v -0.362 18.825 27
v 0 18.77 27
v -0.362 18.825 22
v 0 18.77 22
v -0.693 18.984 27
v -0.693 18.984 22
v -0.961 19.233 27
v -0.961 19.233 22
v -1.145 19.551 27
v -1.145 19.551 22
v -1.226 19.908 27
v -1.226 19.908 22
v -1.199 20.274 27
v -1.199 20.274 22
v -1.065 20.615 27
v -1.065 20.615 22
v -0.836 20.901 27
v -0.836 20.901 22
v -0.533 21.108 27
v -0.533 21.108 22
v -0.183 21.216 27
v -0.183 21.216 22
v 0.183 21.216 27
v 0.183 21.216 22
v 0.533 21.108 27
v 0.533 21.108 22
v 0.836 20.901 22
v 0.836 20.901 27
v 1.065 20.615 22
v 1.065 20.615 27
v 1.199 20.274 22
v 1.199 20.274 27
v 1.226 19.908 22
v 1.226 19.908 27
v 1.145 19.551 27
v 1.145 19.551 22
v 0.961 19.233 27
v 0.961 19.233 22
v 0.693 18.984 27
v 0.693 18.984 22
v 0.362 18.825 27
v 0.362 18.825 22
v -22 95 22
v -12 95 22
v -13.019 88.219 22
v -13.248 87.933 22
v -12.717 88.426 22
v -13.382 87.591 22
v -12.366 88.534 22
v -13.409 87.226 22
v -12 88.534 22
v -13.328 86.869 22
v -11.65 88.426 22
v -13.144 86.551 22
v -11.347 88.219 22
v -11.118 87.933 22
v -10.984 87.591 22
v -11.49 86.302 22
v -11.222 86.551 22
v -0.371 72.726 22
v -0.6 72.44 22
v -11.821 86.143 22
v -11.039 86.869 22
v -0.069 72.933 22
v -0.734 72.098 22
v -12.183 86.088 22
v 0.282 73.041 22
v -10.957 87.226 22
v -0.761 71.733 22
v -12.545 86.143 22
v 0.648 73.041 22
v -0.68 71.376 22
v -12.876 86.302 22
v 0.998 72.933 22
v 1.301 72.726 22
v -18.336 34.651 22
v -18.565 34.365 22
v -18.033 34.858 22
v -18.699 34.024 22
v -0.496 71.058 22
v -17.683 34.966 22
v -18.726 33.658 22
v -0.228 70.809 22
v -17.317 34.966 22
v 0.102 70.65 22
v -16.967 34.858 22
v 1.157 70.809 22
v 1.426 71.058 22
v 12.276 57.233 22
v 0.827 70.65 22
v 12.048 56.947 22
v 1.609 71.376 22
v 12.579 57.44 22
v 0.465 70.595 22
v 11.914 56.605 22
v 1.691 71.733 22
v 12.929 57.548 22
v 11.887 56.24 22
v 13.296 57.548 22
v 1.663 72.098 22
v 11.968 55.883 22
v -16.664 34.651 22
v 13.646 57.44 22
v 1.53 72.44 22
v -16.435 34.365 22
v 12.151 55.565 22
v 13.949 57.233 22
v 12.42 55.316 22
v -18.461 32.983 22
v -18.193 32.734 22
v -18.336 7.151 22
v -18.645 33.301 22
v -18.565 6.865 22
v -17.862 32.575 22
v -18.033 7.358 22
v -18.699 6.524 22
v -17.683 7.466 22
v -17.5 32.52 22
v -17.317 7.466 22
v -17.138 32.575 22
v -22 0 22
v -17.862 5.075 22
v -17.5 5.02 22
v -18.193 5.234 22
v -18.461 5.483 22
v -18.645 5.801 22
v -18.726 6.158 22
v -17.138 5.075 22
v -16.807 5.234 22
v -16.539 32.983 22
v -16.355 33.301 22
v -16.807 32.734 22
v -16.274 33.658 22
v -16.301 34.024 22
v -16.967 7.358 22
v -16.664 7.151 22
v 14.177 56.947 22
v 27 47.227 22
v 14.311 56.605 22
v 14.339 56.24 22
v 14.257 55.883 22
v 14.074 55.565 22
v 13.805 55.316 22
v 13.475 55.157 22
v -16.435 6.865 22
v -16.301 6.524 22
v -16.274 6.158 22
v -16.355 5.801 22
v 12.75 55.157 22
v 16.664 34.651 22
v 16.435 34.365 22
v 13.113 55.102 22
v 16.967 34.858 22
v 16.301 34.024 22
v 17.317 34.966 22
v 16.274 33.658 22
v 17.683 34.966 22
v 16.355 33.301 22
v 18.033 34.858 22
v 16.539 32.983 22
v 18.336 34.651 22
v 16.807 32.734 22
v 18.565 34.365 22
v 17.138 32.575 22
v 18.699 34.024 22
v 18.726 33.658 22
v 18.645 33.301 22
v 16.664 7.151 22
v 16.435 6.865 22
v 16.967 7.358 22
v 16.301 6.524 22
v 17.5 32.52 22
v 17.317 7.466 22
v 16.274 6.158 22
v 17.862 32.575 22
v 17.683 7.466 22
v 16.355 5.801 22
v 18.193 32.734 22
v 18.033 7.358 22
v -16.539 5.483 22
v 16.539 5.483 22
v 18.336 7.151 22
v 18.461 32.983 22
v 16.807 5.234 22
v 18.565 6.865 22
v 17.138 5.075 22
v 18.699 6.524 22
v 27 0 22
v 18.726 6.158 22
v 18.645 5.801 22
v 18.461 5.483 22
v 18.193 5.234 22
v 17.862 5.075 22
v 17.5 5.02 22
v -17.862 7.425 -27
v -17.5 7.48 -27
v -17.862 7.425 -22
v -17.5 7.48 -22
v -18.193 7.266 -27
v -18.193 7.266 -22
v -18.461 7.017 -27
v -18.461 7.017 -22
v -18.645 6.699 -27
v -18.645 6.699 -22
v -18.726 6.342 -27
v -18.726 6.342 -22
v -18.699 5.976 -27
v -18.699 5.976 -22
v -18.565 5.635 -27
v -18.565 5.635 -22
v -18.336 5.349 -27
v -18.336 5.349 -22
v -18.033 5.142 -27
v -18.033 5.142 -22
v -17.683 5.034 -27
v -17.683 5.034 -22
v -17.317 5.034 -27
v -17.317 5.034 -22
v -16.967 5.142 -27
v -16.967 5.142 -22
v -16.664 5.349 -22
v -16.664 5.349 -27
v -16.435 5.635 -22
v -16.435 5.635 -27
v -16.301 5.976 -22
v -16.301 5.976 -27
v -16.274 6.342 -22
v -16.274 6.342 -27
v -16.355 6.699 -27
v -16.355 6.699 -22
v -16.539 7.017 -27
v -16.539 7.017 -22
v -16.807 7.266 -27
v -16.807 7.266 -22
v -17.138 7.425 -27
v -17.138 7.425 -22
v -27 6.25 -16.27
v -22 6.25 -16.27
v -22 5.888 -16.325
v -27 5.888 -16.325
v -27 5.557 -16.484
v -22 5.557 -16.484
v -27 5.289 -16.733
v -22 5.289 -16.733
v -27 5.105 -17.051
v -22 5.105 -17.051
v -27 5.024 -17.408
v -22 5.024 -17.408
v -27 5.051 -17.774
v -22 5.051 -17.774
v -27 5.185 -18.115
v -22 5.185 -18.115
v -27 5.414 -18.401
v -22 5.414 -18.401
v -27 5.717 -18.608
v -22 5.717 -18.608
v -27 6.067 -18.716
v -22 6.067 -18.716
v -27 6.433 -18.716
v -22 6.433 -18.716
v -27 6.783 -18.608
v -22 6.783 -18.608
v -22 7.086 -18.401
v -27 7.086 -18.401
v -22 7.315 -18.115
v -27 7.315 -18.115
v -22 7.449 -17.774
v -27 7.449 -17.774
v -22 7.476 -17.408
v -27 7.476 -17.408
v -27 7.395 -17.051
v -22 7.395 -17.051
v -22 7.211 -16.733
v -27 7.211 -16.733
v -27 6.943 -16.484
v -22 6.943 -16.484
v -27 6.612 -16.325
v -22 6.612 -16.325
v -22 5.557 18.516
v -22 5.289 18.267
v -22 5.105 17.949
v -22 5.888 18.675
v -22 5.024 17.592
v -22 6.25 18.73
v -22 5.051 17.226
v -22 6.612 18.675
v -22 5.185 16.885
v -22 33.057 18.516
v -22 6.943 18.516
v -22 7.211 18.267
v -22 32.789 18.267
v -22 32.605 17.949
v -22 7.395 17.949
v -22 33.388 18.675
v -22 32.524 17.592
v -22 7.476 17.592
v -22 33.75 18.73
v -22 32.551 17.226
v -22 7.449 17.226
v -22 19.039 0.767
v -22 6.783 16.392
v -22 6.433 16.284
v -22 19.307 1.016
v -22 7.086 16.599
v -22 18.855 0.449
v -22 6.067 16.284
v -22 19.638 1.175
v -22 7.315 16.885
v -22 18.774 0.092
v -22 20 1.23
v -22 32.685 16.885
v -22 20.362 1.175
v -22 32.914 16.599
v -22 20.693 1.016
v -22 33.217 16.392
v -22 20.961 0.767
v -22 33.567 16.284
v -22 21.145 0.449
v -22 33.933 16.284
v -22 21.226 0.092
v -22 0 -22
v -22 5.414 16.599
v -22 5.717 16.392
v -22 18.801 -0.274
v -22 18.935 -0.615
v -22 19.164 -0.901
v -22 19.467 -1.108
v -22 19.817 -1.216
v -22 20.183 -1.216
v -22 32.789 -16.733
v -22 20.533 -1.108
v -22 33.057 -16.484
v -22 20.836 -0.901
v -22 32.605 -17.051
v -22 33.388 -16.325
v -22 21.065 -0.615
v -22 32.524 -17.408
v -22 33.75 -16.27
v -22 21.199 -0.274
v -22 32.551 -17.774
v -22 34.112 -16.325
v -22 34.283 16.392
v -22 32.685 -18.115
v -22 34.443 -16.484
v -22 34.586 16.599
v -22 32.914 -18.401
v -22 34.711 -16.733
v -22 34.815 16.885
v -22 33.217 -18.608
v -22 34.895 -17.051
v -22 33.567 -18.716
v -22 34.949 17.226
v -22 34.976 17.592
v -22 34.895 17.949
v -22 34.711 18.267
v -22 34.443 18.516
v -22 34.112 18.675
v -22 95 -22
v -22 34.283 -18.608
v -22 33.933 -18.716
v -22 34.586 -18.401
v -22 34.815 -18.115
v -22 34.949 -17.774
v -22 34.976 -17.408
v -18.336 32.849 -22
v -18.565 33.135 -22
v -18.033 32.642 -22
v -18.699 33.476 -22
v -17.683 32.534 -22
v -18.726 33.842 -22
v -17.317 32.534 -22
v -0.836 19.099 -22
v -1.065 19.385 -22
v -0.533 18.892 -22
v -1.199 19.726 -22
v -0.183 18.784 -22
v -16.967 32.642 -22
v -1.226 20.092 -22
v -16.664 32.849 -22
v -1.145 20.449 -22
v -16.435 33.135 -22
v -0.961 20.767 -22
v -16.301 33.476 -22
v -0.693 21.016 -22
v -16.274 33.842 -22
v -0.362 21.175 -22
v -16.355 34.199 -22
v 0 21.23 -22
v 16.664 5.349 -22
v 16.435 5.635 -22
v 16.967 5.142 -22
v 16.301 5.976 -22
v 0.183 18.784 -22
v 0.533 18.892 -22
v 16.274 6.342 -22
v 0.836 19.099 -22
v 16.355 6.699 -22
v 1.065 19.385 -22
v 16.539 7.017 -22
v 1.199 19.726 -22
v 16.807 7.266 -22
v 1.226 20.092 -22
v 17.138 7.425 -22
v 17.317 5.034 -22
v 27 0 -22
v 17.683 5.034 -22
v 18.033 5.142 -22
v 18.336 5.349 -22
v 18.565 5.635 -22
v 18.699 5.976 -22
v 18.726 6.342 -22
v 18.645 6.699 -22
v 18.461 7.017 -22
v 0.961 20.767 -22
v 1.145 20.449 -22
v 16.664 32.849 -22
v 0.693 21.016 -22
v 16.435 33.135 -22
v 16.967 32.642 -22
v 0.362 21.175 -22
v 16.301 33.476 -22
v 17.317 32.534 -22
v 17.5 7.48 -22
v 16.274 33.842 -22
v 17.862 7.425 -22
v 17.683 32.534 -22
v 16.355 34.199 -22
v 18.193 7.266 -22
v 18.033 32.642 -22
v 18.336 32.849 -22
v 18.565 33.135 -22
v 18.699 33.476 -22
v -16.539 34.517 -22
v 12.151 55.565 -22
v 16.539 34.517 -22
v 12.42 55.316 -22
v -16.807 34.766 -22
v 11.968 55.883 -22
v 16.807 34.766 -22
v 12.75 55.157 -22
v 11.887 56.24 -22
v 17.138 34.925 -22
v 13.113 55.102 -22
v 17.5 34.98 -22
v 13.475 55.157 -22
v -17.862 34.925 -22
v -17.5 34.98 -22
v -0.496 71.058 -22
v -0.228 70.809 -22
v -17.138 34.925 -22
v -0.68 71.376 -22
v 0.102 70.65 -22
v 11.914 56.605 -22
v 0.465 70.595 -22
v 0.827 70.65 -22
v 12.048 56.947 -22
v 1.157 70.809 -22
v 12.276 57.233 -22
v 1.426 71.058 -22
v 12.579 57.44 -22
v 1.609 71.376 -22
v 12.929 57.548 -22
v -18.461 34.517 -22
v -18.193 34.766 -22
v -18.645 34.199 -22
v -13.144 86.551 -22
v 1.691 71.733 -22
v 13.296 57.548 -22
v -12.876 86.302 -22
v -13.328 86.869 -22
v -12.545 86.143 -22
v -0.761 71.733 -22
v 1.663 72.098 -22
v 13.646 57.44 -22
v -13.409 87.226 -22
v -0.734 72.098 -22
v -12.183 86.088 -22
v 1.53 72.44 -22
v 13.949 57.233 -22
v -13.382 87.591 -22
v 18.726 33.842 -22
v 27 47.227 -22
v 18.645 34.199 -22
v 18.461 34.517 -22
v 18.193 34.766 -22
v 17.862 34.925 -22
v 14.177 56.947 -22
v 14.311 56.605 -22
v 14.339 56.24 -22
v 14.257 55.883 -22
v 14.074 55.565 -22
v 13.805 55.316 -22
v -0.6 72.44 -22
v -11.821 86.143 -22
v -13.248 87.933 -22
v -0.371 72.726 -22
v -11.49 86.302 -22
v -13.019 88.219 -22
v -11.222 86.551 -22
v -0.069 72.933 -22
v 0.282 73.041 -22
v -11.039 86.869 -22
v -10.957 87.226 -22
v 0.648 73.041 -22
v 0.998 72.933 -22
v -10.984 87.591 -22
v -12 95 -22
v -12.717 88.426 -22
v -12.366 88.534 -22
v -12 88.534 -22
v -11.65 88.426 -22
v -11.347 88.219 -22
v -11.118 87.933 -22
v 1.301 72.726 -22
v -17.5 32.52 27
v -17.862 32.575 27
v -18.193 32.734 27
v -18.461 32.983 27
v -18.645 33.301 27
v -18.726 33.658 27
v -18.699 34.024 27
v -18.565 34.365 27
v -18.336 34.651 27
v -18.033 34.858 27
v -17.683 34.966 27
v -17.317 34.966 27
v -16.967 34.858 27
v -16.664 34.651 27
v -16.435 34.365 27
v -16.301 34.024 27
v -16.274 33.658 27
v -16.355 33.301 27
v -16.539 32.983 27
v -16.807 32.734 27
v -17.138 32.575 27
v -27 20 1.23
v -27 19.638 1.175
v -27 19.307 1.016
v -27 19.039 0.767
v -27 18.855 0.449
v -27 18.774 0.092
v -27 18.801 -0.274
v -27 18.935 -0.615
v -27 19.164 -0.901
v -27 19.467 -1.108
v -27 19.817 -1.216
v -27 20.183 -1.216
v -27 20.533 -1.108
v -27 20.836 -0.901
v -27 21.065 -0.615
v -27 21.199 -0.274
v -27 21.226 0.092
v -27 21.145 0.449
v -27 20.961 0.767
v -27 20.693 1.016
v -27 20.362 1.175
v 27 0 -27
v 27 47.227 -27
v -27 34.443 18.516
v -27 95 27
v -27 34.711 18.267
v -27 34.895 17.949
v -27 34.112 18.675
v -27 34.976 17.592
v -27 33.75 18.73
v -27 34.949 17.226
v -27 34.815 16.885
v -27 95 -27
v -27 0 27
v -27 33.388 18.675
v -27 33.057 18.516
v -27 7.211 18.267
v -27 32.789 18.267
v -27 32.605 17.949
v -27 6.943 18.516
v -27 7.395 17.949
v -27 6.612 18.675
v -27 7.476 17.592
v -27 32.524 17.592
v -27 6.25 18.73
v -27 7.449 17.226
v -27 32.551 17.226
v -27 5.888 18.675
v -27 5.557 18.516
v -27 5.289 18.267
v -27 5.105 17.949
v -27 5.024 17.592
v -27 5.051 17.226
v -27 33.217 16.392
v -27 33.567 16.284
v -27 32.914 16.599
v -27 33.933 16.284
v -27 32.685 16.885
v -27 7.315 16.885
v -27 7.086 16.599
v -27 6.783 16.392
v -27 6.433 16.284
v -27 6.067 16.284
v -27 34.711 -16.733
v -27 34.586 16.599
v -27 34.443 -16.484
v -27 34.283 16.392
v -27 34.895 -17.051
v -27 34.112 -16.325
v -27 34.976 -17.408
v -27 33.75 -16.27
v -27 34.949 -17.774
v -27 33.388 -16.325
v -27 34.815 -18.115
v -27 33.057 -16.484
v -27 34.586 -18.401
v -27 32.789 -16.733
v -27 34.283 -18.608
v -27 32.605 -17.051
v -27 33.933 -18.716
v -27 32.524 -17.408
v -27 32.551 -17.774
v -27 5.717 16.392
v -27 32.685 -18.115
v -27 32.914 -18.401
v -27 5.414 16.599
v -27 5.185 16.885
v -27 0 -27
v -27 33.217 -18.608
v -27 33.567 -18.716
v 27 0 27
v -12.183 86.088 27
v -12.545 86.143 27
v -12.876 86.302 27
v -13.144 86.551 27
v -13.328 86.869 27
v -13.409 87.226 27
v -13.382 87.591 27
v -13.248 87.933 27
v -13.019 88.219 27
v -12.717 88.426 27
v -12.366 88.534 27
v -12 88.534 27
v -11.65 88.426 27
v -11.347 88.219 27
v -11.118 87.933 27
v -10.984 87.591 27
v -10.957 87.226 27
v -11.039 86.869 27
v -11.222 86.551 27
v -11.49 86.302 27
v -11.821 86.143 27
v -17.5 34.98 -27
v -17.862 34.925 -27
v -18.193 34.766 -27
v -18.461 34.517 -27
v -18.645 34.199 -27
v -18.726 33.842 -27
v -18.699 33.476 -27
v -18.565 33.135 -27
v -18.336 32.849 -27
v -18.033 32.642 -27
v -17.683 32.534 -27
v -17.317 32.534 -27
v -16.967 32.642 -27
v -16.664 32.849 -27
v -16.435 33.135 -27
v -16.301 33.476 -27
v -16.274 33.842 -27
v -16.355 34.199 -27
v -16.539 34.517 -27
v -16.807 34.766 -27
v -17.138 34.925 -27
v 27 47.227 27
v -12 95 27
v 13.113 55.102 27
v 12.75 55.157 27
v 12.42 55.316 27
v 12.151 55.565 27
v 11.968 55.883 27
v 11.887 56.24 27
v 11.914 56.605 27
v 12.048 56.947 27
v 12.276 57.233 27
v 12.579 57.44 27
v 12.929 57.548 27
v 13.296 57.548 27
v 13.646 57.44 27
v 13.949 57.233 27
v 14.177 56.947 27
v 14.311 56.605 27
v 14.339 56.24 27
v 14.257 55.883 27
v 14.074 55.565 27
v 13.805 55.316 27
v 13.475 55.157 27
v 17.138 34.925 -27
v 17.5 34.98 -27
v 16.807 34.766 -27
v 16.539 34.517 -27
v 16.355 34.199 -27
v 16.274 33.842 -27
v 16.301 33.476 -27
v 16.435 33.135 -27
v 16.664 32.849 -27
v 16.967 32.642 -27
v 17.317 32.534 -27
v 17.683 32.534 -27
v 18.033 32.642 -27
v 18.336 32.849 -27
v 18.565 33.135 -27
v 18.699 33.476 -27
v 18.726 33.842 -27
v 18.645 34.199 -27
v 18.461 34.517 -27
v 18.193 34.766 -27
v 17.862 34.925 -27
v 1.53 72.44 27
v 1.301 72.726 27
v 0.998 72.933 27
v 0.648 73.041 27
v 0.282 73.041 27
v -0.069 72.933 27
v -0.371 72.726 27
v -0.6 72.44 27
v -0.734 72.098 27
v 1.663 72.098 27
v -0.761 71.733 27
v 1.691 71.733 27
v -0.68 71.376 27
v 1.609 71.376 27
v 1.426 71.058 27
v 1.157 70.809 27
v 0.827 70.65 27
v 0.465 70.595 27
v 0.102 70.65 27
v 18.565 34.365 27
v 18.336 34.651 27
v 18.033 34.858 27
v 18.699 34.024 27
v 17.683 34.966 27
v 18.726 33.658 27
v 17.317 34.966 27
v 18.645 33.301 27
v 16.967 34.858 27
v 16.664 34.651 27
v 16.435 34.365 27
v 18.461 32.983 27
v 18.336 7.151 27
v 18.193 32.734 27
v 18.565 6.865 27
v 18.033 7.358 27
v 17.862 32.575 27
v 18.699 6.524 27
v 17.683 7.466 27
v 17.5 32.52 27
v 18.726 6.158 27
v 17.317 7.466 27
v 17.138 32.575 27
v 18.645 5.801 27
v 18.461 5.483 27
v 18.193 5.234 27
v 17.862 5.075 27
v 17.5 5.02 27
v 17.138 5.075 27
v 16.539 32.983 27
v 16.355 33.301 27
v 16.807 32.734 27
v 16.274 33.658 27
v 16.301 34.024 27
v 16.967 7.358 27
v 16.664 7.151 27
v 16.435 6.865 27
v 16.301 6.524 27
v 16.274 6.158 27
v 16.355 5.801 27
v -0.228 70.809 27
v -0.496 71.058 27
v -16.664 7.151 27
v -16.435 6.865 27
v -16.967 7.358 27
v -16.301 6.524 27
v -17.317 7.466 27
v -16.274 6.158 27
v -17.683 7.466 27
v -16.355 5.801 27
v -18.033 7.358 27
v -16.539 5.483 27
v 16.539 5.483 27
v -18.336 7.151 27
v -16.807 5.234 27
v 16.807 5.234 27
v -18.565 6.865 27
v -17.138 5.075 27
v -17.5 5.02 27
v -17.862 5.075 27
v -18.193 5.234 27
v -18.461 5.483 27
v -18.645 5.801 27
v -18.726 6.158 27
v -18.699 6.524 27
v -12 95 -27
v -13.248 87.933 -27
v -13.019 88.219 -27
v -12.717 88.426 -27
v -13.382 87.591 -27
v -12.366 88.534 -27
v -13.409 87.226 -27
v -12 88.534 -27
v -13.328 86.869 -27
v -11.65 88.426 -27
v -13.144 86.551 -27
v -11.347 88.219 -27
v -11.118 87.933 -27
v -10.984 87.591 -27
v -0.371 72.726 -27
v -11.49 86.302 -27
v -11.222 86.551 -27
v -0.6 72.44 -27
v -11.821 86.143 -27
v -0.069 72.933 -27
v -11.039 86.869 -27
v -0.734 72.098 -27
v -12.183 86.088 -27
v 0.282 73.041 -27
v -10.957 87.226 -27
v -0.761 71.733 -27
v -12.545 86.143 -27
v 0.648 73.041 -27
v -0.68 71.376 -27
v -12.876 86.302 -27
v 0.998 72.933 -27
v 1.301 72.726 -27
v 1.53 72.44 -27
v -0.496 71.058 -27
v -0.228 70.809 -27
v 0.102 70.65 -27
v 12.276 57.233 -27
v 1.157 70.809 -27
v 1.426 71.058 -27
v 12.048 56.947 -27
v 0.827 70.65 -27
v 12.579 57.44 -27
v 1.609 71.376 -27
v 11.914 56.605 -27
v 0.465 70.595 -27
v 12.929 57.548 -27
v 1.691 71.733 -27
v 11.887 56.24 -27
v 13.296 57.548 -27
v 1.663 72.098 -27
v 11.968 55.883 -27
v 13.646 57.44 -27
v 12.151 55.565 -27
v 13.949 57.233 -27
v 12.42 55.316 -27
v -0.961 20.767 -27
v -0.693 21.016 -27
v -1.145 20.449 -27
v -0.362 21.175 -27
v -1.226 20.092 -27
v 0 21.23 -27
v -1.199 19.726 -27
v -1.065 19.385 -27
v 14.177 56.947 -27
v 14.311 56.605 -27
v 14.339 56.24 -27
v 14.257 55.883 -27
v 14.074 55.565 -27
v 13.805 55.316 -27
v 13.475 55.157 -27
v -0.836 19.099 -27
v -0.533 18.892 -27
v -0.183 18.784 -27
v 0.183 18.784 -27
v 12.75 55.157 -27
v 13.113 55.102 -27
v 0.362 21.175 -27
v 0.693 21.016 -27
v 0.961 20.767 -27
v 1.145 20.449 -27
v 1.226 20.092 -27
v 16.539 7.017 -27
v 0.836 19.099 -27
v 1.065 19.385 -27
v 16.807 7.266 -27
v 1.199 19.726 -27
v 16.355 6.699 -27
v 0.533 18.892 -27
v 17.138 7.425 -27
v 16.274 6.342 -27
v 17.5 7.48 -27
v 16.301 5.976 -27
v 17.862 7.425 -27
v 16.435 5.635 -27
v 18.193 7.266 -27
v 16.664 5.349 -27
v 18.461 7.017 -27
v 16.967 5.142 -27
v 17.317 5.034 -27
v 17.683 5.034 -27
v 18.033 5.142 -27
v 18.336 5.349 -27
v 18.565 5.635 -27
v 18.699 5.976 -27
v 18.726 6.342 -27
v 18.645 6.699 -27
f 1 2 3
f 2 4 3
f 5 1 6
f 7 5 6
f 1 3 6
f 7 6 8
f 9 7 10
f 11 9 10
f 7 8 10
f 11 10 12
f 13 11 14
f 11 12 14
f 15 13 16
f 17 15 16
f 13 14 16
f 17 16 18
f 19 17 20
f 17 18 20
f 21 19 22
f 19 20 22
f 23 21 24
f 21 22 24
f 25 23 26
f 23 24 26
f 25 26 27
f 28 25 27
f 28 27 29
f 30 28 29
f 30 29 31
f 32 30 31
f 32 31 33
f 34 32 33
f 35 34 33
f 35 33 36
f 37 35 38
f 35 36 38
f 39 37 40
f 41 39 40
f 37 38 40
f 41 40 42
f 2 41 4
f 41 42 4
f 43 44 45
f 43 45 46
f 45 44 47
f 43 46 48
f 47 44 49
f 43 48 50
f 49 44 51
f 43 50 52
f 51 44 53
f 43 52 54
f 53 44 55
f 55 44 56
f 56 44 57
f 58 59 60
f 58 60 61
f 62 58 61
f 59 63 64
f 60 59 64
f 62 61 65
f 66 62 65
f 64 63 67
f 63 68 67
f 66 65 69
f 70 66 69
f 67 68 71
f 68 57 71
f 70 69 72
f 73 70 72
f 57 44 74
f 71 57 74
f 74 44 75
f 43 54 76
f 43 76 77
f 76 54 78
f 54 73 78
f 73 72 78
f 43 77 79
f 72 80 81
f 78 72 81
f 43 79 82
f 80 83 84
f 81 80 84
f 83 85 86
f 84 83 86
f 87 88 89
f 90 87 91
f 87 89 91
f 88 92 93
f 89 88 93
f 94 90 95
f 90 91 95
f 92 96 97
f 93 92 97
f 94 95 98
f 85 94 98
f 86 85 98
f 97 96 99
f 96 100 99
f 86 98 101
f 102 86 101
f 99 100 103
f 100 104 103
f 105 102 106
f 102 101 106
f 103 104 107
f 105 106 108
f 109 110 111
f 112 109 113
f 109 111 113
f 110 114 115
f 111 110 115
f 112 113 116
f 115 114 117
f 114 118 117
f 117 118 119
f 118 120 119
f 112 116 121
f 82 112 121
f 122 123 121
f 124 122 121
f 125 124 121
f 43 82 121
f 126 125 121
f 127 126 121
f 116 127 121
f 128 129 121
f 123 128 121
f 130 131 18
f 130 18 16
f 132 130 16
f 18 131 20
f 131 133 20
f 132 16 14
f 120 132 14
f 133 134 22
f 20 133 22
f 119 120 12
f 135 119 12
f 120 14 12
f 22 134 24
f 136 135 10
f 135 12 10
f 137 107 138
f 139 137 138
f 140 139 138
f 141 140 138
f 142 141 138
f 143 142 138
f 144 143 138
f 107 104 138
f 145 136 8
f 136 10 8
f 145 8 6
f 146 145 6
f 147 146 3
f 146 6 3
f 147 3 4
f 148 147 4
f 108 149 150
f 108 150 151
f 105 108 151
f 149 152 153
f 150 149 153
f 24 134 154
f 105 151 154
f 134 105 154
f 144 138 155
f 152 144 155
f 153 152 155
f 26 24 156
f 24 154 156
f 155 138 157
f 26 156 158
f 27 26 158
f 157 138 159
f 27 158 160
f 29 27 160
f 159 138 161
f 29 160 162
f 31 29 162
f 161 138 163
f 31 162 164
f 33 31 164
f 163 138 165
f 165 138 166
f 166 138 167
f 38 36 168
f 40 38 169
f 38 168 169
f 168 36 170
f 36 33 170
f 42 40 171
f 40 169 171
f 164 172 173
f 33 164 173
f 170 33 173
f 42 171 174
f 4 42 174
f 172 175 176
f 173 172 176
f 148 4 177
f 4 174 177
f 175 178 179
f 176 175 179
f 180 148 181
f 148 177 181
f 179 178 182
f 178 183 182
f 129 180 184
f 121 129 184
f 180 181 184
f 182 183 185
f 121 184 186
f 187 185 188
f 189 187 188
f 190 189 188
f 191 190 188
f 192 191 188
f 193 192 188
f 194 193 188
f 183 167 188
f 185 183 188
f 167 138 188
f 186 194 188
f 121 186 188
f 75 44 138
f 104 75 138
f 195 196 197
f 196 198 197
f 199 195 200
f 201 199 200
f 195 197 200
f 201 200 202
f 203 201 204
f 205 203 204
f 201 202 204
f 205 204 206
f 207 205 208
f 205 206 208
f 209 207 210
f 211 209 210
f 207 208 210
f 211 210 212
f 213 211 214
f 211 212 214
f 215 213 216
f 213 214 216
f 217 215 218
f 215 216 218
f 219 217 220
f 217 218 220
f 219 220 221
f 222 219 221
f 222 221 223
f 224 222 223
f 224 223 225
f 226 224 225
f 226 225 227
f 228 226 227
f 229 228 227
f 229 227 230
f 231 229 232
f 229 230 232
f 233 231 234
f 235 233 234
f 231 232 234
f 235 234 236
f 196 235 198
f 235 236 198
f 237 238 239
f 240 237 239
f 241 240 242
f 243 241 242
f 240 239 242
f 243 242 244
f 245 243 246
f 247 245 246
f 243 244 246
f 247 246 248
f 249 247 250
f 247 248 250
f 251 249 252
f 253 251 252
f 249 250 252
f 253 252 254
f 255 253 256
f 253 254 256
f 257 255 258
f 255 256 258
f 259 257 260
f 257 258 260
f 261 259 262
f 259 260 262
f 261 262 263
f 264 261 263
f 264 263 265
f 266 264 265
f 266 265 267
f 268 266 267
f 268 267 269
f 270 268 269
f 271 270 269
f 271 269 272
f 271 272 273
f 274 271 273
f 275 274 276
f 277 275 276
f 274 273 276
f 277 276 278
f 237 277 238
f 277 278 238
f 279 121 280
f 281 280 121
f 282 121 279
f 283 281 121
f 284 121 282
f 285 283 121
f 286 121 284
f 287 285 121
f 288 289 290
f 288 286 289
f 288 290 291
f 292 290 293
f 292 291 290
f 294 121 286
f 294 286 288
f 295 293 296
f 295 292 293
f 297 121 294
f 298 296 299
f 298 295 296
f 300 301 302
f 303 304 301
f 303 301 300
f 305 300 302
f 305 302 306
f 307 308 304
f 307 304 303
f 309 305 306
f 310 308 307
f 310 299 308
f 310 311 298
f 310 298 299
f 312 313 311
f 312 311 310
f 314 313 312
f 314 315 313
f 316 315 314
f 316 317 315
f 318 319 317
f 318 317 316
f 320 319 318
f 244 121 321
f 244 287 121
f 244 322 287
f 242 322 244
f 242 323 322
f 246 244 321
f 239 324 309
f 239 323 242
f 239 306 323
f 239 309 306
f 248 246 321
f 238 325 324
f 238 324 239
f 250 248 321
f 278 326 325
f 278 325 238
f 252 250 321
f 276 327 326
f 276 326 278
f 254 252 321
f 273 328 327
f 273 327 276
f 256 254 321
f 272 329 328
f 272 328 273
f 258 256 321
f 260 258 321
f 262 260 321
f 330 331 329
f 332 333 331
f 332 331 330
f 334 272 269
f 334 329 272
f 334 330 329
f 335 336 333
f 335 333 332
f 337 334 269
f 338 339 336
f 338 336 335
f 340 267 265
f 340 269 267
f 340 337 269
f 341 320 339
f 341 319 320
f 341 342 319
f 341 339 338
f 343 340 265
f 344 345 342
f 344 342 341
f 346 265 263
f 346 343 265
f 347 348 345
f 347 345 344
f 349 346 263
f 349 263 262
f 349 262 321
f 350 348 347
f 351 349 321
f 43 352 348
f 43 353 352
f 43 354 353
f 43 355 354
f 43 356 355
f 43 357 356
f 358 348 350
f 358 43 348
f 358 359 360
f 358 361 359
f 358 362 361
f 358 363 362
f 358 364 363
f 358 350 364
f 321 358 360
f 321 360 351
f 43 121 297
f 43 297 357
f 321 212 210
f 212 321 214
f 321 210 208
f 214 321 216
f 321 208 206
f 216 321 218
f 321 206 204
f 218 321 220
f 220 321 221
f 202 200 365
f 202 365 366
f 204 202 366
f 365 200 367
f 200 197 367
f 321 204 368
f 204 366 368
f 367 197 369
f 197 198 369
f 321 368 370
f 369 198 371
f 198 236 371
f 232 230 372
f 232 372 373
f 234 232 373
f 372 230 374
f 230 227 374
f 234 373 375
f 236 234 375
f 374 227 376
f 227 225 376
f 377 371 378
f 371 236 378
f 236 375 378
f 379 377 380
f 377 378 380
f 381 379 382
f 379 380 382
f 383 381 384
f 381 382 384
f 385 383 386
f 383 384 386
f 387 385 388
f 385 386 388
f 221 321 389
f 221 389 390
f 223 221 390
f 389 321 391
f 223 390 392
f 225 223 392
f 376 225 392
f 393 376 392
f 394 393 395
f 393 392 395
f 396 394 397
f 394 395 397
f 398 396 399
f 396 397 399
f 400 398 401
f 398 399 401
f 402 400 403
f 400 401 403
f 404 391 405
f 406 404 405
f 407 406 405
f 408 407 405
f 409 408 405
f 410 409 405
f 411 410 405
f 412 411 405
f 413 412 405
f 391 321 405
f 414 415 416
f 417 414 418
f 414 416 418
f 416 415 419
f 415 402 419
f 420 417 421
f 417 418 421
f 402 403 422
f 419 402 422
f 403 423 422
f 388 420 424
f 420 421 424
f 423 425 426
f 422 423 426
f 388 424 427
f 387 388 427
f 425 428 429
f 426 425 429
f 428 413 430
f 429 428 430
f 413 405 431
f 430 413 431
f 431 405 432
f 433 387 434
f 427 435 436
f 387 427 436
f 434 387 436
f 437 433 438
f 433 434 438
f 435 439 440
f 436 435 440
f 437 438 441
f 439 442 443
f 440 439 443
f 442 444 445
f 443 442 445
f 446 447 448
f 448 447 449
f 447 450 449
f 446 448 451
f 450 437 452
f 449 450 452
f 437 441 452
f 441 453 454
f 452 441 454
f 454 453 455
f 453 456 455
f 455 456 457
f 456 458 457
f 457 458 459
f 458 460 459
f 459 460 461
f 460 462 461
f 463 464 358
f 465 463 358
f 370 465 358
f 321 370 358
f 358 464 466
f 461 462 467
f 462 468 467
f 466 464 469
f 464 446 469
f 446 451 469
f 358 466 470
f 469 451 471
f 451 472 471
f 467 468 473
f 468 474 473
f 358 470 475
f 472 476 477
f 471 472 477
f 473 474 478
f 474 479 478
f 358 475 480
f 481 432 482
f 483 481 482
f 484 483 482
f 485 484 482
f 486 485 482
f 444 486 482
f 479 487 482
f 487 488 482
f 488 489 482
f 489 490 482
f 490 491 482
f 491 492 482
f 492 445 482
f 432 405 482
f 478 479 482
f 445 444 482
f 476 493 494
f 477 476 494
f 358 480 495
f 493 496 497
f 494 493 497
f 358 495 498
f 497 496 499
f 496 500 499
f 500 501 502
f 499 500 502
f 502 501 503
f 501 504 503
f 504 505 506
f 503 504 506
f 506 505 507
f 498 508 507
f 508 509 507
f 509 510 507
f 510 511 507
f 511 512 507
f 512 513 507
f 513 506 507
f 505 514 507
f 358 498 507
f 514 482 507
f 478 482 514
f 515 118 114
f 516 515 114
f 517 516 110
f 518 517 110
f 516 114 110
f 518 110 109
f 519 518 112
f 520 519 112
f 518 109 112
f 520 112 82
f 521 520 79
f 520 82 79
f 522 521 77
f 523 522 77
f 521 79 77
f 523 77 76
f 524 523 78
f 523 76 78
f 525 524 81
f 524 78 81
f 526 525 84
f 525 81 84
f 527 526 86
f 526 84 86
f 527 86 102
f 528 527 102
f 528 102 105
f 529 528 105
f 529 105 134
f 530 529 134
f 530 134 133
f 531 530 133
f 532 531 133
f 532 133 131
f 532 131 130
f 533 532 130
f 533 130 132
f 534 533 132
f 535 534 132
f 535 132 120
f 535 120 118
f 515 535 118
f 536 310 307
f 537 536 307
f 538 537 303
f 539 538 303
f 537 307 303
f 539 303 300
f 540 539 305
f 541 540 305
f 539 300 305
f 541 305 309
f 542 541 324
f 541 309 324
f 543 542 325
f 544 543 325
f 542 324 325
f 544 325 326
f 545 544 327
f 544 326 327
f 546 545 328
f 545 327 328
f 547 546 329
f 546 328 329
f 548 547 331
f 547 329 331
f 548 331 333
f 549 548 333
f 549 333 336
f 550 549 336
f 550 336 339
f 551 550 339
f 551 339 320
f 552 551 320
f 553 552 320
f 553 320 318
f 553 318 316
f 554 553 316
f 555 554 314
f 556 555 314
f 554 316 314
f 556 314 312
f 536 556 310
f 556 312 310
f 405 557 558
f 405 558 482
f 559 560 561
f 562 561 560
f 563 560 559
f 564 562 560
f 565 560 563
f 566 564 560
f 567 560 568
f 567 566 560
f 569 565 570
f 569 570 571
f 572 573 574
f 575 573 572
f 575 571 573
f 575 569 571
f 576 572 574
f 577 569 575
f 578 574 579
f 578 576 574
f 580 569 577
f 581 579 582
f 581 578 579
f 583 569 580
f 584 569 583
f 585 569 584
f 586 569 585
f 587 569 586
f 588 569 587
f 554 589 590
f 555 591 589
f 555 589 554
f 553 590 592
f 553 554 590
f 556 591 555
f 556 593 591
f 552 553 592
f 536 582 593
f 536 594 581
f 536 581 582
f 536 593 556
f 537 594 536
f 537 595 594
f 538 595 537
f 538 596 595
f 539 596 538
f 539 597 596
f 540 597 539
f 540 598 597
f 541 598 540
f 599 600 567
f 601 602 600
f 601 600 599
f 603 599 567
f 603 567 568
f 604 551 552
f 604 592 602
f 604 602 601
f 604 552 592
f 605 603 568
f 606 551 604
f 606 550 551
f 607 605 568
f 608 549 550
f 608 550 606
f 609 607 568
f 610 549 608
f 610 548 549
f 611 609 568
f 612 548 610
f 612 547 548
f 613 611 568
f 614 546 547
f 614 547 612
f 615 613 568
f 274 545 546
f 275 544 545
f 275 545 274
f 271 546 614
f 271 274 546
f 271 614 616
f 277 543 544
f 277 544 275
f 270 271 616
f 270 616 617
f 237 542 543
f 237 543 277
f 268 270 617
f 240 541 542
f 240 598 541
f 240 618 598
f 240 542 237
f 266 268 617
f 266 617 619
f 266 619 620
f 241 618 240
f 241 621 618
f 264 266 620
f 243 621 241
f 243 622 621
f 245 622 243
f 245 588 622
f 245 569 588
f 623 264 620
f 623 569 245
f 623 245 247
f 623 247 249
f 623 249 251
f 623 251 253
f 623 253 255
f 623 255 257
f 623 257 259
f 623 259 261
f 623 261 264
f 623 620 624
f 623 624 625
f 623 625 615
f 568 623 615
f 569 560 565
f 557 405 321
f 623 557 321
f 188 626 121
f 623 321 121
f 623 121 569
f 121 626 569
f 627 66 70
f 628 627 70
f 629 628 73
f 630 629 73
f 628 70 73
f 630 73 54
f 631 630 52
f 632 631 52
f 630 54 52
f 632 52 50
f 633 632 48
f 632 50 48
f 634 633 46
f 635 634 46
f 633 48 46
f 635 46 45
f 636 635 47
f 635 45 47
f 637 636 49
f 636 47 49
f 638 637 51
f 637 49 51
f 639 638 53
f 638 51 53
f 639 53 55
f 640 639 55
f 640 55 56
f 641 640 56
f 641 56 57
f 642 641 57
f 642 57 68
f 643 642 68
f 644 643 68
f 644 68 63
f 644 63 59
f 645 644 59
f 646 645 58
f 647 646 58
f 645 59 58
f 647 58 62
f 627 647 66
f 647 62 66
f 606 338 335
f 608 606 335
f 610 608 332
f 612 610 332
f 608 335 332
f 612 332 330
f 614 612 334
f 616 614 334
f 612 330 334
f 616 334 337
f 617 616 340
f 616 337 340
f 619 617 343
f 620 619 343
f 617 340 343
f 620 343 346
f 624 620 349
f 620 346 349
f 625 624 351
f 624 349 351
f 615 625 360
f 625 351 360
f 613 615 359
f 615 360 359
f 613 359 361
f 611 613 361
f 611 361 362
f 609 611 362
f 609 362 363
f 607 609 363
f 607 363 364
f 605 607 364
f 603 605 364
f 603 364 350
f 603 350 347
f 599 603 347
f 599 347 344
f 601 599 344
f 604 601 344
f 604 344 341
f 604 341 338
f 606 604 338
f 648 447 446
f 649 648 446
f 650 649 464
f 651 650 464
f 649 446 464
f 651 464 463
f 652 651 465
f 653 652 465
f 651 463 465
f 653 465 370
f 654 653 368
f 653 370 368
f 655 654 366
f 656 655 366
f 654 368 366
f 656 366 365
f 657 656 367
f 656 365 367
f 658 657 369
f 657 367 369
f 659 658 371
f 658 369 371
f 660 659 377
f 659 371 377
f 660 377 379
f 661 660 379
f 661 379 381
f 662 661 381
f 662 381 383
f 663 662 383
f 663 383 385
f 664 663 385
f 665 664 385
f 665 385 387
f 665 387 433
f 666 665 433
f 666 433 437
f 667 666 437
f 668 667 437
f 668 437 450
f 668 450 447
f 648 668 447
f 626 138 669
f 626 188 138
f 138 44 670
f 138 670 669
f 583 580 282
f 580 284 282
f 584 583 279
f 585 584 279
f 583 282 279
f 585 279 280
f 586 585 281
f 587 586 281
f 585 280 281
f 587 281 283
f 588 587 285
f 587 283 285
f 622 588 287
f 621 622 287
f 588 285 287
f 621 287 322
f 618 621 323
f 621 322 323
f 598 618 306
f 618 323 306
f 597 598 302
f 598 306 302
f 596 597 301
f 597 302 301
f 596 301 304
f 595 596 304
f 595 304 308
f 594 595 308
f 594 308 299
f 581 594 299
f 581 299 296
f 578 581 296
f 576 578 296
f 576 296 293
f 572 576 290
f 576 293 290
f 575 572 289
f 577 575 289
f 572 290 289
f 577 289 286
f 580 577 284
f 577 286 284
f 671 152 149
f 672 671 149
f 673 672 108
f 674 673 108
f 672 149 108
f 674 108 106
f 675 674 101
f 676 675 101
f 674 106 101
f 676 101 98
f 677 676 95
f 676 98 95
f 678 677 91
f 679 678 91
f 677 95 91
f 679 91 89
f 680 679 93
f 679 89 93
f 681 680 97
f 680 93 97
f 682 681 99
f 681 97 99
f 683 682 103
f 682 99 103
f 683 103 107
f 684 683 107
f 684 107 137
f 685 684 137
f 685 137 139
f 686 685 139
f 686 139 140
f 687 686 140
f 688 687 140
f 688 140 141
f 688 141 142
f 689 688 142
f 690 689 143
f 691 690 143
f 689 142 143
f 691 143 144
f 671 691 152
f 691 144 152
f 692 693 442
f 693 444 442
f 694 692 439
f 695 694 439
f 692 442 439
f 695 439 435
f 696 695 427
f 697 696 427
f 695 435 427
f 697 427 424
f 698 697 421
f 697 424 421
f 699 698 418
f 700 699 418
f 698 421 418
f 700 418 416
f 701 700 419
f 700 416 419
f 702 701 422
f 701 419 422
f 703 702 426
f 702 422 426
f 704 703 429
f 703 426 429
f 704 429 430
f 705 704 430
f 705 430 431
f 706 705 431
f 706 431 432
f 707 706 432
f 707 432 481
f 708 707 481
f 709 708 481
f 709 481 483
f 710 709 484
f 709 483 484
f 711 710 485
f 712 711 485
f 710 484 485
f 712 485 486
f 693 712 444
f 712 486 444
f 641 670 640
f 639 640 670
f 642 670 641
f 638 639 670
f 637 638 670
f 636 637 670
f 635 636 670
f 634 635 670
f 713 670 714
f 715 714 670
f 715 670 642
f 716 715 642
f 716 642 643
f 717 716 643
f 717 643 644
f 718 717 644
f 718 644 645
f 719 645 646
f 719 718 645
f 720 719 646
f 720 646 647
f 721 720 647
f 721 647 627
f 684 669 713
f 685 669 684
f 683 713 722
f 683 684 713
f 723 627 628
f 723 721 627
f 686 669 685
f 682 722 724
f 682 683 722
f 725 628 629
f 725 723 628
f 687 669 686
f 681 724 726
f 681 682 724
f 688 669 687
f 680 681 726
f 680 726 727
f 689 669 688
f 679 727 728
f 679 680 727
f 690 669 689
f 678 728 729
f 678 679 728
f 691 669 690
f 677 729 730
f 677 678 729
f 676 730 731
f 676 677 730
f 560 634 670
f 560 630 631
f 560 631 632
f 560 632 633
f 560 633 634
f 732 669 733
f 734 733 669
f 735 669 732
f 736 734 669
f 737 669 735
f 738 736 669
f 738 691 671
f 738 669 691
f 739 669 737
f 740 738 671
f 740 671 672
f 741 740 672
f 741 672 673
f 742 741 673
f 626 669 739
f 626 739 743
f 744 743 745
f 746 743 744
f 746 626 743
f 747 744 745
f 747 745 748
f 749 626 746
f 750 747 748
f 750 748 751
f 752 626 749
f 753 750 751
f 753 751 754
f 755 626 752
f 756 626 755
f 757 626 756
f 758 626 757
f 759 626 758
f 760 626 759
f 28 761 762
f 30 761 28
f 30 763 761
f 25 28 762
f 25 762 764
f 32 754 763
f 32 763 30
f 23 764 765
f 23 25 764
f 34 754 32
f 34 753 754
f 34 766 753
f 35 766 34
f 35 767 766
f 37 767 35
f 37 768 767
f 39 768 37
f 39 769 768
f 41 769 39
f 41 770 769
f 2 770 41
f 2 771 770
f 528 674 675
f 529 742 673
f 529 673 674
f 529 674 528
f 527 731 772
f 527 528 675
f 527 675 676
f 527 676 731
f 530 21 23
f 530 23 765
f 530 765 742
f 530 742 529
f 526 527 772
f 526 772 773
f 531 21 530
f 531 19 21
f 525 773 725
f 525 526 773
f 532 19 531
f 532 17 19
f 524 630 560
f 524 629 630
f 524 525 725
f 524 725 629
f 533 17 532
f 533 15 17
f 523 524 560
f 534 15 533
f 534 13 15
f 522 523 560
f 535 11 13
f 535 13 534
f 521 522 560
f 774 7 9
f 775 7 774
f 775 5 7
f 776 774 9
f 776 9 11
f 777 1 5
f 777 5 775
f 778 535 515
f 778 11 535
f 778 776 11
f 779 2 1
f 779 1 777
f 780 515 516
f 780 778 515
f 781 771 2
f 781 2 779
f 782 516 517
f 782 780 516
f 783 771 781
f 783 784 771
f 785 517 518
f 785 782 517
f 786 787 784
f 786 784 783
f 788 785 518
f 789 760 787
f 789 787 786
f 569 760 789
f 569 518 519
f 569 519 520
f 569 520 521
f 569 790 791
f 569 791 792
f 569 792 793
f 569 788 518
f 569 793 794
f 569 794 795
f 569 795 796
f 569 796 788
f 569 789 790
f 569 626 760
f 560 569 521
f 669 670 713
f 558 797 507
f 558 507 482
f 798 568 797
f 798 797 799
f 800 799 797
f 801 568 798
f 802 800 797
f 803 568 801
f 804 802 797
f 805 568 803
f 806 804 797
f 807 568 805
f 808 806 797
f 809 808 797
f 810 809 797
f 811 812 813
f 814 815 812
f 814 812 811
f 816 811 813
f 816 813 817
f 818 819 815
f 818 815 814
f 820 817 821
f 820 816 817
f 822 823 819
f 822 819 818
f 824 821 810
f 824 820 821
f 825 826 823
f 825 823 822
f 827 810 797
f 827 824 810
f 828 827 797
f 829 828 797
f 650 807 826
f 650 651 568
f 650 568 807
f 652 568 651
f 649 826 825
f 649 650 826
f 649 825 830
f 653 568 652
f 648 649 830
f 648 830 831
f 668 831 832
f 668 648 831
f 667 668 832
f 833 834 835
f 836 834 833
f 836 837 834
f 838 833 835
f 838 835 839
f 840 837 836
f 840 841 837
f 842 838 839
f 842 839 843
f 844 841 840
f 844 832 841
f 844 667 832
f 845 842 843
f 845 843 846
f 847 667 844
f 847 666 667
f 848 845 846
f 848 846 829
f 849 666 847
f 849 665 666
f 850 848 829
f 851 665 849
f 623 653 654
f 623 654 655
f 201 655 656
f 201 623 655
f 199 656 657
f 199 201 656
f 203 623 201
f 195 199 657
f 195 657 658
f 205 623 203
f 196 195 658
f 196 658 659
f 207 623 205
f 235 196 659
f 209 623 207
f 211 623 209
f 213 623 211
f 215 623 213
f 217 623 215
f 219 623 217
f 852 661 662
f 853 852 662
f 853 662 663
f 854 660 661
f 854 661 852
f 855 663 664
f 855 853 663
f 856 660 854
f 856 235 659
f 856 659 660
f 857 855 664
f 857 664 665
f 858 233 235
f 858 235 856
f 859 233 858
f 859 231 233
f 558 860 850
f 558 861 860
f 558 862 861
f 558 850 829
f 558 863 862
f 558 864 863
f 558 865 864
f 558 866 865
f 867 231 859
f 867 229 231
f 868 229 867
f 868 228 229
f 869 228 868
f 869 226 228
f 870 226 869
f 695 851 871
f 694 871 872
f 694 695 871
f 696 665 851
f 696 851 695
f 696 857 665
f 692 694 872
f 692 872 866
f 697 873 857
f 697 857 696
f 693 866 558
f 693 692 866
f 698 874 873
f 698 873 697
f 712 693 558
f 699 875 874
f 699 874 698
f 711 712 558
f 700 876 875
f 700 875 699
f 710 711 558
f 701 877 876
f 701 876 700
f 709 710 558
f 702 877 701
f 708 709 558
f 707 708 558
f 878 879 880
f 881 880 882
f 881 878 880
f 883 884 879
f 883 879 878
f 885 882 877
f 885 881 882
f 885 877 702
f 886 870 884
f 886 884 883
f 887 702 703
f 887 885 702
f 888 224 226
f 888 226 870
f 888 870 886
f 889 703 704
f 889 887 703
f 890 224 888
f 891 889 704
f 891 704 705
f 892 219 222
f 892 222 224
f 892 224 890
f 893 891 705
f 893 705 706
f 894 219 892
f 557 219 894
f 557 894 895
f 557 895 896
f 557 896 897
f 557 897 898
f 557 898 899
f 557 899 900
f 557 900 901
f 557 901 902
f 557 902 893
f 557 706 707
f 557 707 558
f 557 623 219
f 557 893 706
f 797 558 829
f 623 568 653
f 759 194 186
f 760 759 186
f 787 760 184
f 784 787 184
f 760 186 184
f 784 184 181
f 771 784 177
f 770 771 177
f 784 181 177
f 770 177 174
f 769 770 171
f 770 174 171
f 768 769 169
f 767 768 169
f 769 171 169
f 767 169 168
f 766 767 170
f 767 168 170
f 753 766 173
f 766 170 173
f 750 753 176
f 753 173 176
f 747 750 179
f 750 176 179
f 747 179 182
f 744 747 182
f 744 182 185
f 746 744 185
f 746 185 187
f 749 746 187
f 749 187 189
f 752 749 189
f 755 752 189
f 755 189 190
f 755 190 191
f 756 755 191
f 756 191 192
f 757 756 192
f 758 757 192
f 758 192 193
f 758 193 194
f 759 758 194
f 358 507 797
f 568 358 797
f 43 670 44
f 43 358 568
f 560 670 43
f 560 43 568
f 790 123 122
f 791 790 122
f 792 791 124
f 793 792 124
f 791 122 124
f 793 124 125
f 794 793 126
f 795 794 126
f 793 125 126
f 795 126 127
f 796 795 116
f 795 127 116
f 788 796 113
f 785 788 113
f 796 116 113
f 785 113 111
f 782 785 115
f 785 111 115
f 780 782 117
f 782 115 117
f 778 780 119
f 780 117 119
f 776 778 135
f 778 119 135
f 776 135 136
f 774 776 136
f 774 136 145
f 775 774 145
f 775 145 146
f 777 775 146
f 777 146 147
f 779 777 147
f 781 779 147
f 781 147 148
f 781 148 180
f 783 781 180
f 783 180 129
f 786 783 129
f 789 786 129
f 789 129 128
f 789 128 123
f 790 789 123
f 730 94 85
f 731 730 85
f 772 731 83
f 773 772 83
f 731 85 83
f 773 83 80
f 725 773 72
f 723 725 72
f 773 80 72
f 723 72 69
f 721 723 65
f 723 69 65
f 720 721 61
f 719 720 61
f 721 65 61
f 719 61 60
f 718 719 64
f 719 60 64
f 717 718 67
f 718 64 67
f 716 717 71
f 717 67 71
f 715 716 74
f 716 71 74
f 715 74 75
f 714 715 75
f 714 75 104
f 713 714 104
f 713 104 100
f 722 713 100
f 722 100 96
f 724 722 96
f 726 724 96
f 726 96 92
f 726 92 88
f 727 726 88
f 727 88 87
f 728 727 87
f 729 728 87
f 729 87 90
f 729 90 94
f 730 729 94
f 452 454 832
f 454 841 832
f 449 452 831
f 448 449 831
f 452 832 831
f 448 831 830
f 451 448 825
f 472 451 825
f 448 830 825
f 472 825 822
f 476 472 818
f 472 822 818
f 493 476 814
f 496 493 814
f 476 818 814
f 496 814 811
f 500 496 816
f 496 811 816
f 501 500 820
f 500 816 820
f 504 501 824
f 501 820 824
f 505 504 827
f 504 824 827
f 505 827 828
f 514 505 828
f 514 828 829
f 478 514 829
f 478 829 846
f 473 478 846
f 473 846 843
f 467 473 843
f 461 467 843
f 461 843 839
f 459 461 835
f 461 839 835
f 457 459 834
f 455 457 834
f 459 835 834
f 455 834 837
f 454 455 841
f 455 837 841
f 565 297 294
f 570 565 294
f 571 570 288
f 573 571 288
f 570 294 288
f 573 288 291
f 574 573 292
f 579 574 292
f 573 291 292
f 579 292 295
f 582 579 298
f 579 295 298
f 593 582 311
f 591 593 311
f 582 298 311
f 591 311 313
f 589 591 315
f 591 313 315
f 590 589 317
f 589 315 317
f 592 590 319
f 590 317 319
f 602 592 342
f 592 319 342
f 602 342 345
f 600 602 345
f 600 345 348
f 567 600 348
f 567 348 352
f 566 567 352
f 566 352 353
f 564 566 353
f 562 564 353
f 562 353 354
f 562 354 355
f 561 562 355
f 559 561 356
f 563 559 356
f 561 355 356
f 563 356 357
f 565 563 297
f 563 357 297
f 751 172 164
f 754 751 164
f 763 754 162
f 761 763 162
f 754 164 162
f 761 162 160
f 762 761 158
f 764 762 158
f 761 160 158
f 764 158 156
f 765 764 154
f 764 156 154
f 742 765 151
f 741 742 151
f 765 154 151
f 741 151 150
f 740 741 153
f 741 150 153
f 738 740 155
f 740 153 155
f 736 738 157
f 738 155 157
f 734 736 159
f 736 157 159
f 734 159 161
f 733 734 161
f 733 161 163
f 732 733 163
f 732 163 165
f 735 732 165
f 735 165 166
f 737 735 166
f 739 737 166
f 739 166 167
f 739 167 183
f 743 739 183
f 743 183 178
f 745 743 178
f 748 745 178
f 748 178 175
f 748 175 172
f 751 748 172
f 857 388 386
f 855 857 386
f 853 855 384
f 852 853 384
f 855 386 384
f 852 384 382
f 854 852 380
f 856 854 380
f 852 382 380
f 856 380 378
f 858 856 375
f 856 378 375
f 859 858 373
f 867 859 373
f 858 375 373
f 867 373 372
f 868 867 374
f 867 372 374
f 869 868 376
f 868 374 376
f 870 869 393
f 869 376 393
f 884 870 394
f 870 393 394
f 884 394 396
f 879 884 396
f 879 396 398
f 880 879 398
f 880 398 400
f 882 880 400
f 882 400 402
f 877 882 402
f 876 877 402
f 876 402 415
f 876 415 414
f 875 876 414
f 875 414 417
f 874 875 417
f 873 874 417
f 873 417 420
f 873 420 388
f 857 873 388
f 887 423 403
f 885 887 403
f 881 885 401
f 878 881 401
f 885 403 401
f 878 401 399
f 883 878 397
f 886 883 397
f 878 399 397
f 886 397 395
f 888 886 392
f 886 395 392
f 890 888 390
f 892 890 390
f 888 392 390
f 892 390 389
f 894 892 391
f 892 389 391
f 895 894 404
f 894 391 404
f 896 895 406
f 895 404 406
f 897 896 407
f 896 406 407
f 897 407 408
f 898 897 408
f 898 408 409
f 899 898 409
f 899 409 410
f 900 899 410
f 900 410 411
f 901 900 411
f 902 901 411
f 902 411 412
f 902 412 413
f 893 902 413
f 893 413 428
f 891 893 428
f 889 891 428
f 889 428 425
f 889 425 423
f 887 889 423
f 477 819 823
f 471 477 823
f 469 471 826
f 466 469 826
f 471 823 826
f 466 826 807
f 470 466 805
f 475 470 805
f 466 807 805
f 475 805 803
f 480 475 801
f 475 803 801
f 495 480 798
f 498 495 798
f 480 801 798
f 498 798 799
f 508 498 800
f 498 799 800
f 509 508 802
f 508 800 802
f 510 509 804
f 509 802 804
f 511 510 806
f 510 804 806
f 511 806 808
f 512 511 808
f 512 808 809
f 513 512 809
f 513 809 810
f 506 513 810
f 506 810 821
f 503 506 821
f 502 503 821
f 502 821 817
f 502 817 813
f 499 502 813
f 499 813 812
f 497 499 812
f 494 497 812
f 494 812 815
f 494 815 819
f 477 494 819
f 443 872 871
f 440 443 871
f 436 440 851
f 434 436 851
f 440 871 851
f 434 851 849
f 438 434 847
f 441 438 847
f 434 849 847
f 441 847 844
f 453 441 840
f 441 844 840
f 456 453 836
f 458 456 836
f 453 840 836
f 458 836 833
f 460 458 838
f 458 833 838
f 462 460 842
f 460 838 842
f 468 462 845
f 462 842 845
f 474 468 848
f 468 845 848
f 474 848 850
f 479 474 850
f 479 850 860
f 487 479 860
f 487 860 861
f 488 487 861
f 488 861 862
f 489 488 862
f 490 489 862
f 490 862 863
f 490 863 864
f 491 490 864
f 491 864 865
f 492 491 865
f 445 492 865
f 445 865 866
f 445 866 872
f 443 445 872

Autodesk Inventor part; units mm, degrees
ref_plane "YZ Plane" through (0, 0, 0) normal (1, 0, 0) x (0, 1, 0)
ref_plane "XZ Plane" through (0, 0, 0) normal (0, 1, 0) x (-1, 0, 0)
ref_plane "XY Plane" through (0, 0, 0) normal (0, 0, 1) x (1, 0, 0)
sketch "Skizze1" plane through (0, 0, 0) normal (0, 1, 0) x (-1, 0, 0)
  line L0 (-27, 27) -> (27, 27)
  line L1 (27, 27) -> (27, -27)
  line L2 (27, -27) -> (-27, -27)
  line L3 (-27, -27) -> (-27, 27)
  line L4 (-27, 27) -> (27, -27) construction
  line L5 (27, 27) -> (-27, -27) construction
  point P0 (0, 0)
  dimension "d0" = 54
  dimension "d1" = 54
extrude "Extrusion1" add sketch "Skizze1" along normal blind 95
sketch "Skizze2" plane through (27, 0, 27) normal (1, 0, 0) x (0, 0, -1)
  line L0 (5, 0) -> (49, 0)
  line L1 (49, 0) -> (49, 95)
  line L2 (49, 95) -> (5, 95)
  line L3 (5, 95) -> (5, 0)
  line L4 (0, 0) -> (0, 95) projected
  line L5 (54, 0) -> (54, 95) projected
  line L6 (54, 0) -> (0, 0) projected
  line L7 (54, 0) -> (54, 95) projected
  line L8 (0, 95) -> (54, 95) projected
  line L9 (0, 0) -> (0, 95) projected
  line L10 (0, 95) -> (54, 95) projected
  line L11 (54, 0) -> (0, 0) projected
  point P0 (27, 0)
  dimension "d4" = 5
  dimension "d5" = 5
extrude "Extrusion2" cut sketch "Skizze2" against normal blind 49 contours L3 L2 L1 L0
sketch "Skizze3" plane through (27, 0, -27) normal (0, 0, -1) x (-1, 0, 0)
  line L0 (54, 0) -> (0, 0) projected
  line L1 (54, 0) -> (54, 95) projected
  line L2 (0, 95) -> (54, 95) projected
  line L3 (0, 0) -> (0, 95) projected
  line L4 (61.4003, 122.4392) -> (0, 47.227)
  line L5 (0, 47.227) -> (39, 95)
  line L6 (39, 95) -> (33.5775, 99.4267) construction
  line L7 (33.5775, 99.4267) -> (-5.4225, 51.6538) construction
  line L8 (-5.4225, 51.6538) -> (0, 47.227) construction
  line L9 (31.8094, 54.61) -> (-25.1559, 101.1143) construction
  line L10 (27.9901, 92.5825) -> (-13.8409, 126.7317)
  line L11 (-13.8409, 126.7317) -> (-47.9901, 84.9007)
  line L12 (-47.9901, 84.9007) -> (-6.1591, 50.7515) construction
  line L13 (-6.1591, 50.7515) -> (27.9901, 92.5825) construction
  line L14 (27.9901, 92.5825) -> (-47.9901, 84.9007) construction
  line L15 (-13.8409, 126.7317) -> (-6.1591, 50.7515) construction
  line L16 (0, 95) -> (54, 95) projected
  point P0 (27, 0)
  point P1 (-10, 88.7416)
  point P2 (-10, 88.7416)
  dimension "d34" = 7
  dimension "d35" = 61.6706
  dimension "d36" = 25.8353
  dimension "d37" = 54
  dimension "d38" = 54
  dimension "d39" = 15
  dimension "d60" = 10
extrude "Extrusion3" cut sketch "Skizze3" against normal through all contours L3 L2 L4
sketch "Skizze4" plane through (27, 0, -27) normal (0, 0, -1) x (-1, 0, 0)
  line L0 (9.5, 6.25) -> (44.5, 6.25)
  line L1 (44.5, 6.25) -> (44.5, 33.75)
  line L2 (44.5, 33.75) -> (9.5, 33.75)
  line L3 (9.5, 33.75) -> (9.5, 6.25)
  line L4 (9.5, 6.25) -> (44.5, 33.75) construction
  line L5 (44.5, 6.25) -> (9.5, 33.75) construction
  line L6 (27, 0) -> (27, 60.1271) construction
  line L7 (54, 0) -> (0, 0) construction
  point P0 (27, 20)
  point P1 (27, 20)
  dimension "d11" = 35
  dimension "d12" = 27.5
  dimension "d62" = 20
hole "Bohrung1" at (17.5, 33.75, -27) at (-17.5, 33.75, -27) at (-17.5, 6.25, -27) at (0, 20, -27) at (17.5, 6.25, -27) direction (0, 0, 1) diameter 2.459 end up to surface thread size "M3x0.5" class "6H" standard "ISO Metric profile"
sketch "Skizze5" plane through (27, 47.227, -22) normal (0.7746482, 0.6323925, 0) x (0, 0, -1)
  line L0 (-49, 0) -> (-49, 61.6706) projected
  line L1 (-44, 0) -> (-49, 0) projected
  line L2 (-44, 61.6706) -> (-44, 0) projected
  line L3 (0, 61.6706) -> (5, 61.6706) projected
  line L4 (0, 0) -> (0, 61.6706) projected
  line L5 (5, 0) -> (0, 0) projected
  line L6 (5, 61.6706) -> (5, 0) projected
  line L7 (0, 61.6706) -> (5, 61.6706) projected
  line L8 (-49, 0) -> (-49, 61.6706) projected
  line L9 (-44, 0) -> (-49, 0) projected
  line L10 (-44, 61.6706) -> (-44, 0) projected
  line L11 (-49, 61.6706) -> (-44, 61.6706) projected
  line L12 (0, 0) -> (0, 61.6706) projected
  line L13 (5, 0) -> (0, 0) projected
  line L14 (5, 61.6706) -> (5, 0) projected
  line L15 (-49, 61.6706) -> (-44, 61.6706) projected
  point P0 (127.5861, 27)
  point P1 (-46.5, 55)
  point P2 (2.5, 55)
  dimension "d41" = 2.5
  dimension "d42" = 2.5
  dimension "d43" = 55
  dimension "d44" = 55
hole "Bohrung2" [suppressed]
pattern_linear "Rechteckige Anordnung1" [suppressed]
pattern_circular "Runde Anordnung1" count 3 over 180 about axis through (0, -10, 0) along (0, 1, 0) of "Bohrung1"
sketch "Skizze6" plane through (-27, 0, 27) normal (0, 0, 1) x (1, 0, 0)
  circle A0 centre (27, 20) radius 1.2295 projected
  circle A1 centre (9.5, 6.25) radius 1.2295 projected
  circle A2 centre (44.5, 6.25) radius 1.2295 projected
  circle A3 centre (9.5, 33.75) radius 1.2295 projected
  circle A4 centre (44.5, 33.75) radius 1.2295 projected
  line L0 (54, 47.227) -> (15, 95) projected
  line L1 (0, 95) -> (15, 95) projected
  line L2 (0, 0) -> (0, 95) projected
  line L3 (54, 0) -> (0, 0) projected
  line L4 (54, 0) -> (54, 47.227) projected
  line L5 (5, 95) -> (5, 0) construction
  line L6 (15, 95) -> (-19.3701, 66.9416) construction
  line L7 (54, 47.227) -> (15, 95) construction
  point P0 (27, 0)
  point P1 (27.4648, 71.8248)
  dimension "d48" = 5
  dimension "d49" = 25.8353
  dimension "d61" = 61.6706
hole "Bohrung3" at (0.4648, 71.8248, 27) direction (0, 0, -1) diameter 2.459 end through all thread size "M3x0.5" class "6H" standard "ISO Metric profile"
pattern_linear "Rechteckige Anordnung2" count 3 spacing 20 along (-0.6323925, 0.7746482, 0) of "Bohrung3" first direction both ways yes
properties part number "complex_cube" material "Aluminium 6061"
